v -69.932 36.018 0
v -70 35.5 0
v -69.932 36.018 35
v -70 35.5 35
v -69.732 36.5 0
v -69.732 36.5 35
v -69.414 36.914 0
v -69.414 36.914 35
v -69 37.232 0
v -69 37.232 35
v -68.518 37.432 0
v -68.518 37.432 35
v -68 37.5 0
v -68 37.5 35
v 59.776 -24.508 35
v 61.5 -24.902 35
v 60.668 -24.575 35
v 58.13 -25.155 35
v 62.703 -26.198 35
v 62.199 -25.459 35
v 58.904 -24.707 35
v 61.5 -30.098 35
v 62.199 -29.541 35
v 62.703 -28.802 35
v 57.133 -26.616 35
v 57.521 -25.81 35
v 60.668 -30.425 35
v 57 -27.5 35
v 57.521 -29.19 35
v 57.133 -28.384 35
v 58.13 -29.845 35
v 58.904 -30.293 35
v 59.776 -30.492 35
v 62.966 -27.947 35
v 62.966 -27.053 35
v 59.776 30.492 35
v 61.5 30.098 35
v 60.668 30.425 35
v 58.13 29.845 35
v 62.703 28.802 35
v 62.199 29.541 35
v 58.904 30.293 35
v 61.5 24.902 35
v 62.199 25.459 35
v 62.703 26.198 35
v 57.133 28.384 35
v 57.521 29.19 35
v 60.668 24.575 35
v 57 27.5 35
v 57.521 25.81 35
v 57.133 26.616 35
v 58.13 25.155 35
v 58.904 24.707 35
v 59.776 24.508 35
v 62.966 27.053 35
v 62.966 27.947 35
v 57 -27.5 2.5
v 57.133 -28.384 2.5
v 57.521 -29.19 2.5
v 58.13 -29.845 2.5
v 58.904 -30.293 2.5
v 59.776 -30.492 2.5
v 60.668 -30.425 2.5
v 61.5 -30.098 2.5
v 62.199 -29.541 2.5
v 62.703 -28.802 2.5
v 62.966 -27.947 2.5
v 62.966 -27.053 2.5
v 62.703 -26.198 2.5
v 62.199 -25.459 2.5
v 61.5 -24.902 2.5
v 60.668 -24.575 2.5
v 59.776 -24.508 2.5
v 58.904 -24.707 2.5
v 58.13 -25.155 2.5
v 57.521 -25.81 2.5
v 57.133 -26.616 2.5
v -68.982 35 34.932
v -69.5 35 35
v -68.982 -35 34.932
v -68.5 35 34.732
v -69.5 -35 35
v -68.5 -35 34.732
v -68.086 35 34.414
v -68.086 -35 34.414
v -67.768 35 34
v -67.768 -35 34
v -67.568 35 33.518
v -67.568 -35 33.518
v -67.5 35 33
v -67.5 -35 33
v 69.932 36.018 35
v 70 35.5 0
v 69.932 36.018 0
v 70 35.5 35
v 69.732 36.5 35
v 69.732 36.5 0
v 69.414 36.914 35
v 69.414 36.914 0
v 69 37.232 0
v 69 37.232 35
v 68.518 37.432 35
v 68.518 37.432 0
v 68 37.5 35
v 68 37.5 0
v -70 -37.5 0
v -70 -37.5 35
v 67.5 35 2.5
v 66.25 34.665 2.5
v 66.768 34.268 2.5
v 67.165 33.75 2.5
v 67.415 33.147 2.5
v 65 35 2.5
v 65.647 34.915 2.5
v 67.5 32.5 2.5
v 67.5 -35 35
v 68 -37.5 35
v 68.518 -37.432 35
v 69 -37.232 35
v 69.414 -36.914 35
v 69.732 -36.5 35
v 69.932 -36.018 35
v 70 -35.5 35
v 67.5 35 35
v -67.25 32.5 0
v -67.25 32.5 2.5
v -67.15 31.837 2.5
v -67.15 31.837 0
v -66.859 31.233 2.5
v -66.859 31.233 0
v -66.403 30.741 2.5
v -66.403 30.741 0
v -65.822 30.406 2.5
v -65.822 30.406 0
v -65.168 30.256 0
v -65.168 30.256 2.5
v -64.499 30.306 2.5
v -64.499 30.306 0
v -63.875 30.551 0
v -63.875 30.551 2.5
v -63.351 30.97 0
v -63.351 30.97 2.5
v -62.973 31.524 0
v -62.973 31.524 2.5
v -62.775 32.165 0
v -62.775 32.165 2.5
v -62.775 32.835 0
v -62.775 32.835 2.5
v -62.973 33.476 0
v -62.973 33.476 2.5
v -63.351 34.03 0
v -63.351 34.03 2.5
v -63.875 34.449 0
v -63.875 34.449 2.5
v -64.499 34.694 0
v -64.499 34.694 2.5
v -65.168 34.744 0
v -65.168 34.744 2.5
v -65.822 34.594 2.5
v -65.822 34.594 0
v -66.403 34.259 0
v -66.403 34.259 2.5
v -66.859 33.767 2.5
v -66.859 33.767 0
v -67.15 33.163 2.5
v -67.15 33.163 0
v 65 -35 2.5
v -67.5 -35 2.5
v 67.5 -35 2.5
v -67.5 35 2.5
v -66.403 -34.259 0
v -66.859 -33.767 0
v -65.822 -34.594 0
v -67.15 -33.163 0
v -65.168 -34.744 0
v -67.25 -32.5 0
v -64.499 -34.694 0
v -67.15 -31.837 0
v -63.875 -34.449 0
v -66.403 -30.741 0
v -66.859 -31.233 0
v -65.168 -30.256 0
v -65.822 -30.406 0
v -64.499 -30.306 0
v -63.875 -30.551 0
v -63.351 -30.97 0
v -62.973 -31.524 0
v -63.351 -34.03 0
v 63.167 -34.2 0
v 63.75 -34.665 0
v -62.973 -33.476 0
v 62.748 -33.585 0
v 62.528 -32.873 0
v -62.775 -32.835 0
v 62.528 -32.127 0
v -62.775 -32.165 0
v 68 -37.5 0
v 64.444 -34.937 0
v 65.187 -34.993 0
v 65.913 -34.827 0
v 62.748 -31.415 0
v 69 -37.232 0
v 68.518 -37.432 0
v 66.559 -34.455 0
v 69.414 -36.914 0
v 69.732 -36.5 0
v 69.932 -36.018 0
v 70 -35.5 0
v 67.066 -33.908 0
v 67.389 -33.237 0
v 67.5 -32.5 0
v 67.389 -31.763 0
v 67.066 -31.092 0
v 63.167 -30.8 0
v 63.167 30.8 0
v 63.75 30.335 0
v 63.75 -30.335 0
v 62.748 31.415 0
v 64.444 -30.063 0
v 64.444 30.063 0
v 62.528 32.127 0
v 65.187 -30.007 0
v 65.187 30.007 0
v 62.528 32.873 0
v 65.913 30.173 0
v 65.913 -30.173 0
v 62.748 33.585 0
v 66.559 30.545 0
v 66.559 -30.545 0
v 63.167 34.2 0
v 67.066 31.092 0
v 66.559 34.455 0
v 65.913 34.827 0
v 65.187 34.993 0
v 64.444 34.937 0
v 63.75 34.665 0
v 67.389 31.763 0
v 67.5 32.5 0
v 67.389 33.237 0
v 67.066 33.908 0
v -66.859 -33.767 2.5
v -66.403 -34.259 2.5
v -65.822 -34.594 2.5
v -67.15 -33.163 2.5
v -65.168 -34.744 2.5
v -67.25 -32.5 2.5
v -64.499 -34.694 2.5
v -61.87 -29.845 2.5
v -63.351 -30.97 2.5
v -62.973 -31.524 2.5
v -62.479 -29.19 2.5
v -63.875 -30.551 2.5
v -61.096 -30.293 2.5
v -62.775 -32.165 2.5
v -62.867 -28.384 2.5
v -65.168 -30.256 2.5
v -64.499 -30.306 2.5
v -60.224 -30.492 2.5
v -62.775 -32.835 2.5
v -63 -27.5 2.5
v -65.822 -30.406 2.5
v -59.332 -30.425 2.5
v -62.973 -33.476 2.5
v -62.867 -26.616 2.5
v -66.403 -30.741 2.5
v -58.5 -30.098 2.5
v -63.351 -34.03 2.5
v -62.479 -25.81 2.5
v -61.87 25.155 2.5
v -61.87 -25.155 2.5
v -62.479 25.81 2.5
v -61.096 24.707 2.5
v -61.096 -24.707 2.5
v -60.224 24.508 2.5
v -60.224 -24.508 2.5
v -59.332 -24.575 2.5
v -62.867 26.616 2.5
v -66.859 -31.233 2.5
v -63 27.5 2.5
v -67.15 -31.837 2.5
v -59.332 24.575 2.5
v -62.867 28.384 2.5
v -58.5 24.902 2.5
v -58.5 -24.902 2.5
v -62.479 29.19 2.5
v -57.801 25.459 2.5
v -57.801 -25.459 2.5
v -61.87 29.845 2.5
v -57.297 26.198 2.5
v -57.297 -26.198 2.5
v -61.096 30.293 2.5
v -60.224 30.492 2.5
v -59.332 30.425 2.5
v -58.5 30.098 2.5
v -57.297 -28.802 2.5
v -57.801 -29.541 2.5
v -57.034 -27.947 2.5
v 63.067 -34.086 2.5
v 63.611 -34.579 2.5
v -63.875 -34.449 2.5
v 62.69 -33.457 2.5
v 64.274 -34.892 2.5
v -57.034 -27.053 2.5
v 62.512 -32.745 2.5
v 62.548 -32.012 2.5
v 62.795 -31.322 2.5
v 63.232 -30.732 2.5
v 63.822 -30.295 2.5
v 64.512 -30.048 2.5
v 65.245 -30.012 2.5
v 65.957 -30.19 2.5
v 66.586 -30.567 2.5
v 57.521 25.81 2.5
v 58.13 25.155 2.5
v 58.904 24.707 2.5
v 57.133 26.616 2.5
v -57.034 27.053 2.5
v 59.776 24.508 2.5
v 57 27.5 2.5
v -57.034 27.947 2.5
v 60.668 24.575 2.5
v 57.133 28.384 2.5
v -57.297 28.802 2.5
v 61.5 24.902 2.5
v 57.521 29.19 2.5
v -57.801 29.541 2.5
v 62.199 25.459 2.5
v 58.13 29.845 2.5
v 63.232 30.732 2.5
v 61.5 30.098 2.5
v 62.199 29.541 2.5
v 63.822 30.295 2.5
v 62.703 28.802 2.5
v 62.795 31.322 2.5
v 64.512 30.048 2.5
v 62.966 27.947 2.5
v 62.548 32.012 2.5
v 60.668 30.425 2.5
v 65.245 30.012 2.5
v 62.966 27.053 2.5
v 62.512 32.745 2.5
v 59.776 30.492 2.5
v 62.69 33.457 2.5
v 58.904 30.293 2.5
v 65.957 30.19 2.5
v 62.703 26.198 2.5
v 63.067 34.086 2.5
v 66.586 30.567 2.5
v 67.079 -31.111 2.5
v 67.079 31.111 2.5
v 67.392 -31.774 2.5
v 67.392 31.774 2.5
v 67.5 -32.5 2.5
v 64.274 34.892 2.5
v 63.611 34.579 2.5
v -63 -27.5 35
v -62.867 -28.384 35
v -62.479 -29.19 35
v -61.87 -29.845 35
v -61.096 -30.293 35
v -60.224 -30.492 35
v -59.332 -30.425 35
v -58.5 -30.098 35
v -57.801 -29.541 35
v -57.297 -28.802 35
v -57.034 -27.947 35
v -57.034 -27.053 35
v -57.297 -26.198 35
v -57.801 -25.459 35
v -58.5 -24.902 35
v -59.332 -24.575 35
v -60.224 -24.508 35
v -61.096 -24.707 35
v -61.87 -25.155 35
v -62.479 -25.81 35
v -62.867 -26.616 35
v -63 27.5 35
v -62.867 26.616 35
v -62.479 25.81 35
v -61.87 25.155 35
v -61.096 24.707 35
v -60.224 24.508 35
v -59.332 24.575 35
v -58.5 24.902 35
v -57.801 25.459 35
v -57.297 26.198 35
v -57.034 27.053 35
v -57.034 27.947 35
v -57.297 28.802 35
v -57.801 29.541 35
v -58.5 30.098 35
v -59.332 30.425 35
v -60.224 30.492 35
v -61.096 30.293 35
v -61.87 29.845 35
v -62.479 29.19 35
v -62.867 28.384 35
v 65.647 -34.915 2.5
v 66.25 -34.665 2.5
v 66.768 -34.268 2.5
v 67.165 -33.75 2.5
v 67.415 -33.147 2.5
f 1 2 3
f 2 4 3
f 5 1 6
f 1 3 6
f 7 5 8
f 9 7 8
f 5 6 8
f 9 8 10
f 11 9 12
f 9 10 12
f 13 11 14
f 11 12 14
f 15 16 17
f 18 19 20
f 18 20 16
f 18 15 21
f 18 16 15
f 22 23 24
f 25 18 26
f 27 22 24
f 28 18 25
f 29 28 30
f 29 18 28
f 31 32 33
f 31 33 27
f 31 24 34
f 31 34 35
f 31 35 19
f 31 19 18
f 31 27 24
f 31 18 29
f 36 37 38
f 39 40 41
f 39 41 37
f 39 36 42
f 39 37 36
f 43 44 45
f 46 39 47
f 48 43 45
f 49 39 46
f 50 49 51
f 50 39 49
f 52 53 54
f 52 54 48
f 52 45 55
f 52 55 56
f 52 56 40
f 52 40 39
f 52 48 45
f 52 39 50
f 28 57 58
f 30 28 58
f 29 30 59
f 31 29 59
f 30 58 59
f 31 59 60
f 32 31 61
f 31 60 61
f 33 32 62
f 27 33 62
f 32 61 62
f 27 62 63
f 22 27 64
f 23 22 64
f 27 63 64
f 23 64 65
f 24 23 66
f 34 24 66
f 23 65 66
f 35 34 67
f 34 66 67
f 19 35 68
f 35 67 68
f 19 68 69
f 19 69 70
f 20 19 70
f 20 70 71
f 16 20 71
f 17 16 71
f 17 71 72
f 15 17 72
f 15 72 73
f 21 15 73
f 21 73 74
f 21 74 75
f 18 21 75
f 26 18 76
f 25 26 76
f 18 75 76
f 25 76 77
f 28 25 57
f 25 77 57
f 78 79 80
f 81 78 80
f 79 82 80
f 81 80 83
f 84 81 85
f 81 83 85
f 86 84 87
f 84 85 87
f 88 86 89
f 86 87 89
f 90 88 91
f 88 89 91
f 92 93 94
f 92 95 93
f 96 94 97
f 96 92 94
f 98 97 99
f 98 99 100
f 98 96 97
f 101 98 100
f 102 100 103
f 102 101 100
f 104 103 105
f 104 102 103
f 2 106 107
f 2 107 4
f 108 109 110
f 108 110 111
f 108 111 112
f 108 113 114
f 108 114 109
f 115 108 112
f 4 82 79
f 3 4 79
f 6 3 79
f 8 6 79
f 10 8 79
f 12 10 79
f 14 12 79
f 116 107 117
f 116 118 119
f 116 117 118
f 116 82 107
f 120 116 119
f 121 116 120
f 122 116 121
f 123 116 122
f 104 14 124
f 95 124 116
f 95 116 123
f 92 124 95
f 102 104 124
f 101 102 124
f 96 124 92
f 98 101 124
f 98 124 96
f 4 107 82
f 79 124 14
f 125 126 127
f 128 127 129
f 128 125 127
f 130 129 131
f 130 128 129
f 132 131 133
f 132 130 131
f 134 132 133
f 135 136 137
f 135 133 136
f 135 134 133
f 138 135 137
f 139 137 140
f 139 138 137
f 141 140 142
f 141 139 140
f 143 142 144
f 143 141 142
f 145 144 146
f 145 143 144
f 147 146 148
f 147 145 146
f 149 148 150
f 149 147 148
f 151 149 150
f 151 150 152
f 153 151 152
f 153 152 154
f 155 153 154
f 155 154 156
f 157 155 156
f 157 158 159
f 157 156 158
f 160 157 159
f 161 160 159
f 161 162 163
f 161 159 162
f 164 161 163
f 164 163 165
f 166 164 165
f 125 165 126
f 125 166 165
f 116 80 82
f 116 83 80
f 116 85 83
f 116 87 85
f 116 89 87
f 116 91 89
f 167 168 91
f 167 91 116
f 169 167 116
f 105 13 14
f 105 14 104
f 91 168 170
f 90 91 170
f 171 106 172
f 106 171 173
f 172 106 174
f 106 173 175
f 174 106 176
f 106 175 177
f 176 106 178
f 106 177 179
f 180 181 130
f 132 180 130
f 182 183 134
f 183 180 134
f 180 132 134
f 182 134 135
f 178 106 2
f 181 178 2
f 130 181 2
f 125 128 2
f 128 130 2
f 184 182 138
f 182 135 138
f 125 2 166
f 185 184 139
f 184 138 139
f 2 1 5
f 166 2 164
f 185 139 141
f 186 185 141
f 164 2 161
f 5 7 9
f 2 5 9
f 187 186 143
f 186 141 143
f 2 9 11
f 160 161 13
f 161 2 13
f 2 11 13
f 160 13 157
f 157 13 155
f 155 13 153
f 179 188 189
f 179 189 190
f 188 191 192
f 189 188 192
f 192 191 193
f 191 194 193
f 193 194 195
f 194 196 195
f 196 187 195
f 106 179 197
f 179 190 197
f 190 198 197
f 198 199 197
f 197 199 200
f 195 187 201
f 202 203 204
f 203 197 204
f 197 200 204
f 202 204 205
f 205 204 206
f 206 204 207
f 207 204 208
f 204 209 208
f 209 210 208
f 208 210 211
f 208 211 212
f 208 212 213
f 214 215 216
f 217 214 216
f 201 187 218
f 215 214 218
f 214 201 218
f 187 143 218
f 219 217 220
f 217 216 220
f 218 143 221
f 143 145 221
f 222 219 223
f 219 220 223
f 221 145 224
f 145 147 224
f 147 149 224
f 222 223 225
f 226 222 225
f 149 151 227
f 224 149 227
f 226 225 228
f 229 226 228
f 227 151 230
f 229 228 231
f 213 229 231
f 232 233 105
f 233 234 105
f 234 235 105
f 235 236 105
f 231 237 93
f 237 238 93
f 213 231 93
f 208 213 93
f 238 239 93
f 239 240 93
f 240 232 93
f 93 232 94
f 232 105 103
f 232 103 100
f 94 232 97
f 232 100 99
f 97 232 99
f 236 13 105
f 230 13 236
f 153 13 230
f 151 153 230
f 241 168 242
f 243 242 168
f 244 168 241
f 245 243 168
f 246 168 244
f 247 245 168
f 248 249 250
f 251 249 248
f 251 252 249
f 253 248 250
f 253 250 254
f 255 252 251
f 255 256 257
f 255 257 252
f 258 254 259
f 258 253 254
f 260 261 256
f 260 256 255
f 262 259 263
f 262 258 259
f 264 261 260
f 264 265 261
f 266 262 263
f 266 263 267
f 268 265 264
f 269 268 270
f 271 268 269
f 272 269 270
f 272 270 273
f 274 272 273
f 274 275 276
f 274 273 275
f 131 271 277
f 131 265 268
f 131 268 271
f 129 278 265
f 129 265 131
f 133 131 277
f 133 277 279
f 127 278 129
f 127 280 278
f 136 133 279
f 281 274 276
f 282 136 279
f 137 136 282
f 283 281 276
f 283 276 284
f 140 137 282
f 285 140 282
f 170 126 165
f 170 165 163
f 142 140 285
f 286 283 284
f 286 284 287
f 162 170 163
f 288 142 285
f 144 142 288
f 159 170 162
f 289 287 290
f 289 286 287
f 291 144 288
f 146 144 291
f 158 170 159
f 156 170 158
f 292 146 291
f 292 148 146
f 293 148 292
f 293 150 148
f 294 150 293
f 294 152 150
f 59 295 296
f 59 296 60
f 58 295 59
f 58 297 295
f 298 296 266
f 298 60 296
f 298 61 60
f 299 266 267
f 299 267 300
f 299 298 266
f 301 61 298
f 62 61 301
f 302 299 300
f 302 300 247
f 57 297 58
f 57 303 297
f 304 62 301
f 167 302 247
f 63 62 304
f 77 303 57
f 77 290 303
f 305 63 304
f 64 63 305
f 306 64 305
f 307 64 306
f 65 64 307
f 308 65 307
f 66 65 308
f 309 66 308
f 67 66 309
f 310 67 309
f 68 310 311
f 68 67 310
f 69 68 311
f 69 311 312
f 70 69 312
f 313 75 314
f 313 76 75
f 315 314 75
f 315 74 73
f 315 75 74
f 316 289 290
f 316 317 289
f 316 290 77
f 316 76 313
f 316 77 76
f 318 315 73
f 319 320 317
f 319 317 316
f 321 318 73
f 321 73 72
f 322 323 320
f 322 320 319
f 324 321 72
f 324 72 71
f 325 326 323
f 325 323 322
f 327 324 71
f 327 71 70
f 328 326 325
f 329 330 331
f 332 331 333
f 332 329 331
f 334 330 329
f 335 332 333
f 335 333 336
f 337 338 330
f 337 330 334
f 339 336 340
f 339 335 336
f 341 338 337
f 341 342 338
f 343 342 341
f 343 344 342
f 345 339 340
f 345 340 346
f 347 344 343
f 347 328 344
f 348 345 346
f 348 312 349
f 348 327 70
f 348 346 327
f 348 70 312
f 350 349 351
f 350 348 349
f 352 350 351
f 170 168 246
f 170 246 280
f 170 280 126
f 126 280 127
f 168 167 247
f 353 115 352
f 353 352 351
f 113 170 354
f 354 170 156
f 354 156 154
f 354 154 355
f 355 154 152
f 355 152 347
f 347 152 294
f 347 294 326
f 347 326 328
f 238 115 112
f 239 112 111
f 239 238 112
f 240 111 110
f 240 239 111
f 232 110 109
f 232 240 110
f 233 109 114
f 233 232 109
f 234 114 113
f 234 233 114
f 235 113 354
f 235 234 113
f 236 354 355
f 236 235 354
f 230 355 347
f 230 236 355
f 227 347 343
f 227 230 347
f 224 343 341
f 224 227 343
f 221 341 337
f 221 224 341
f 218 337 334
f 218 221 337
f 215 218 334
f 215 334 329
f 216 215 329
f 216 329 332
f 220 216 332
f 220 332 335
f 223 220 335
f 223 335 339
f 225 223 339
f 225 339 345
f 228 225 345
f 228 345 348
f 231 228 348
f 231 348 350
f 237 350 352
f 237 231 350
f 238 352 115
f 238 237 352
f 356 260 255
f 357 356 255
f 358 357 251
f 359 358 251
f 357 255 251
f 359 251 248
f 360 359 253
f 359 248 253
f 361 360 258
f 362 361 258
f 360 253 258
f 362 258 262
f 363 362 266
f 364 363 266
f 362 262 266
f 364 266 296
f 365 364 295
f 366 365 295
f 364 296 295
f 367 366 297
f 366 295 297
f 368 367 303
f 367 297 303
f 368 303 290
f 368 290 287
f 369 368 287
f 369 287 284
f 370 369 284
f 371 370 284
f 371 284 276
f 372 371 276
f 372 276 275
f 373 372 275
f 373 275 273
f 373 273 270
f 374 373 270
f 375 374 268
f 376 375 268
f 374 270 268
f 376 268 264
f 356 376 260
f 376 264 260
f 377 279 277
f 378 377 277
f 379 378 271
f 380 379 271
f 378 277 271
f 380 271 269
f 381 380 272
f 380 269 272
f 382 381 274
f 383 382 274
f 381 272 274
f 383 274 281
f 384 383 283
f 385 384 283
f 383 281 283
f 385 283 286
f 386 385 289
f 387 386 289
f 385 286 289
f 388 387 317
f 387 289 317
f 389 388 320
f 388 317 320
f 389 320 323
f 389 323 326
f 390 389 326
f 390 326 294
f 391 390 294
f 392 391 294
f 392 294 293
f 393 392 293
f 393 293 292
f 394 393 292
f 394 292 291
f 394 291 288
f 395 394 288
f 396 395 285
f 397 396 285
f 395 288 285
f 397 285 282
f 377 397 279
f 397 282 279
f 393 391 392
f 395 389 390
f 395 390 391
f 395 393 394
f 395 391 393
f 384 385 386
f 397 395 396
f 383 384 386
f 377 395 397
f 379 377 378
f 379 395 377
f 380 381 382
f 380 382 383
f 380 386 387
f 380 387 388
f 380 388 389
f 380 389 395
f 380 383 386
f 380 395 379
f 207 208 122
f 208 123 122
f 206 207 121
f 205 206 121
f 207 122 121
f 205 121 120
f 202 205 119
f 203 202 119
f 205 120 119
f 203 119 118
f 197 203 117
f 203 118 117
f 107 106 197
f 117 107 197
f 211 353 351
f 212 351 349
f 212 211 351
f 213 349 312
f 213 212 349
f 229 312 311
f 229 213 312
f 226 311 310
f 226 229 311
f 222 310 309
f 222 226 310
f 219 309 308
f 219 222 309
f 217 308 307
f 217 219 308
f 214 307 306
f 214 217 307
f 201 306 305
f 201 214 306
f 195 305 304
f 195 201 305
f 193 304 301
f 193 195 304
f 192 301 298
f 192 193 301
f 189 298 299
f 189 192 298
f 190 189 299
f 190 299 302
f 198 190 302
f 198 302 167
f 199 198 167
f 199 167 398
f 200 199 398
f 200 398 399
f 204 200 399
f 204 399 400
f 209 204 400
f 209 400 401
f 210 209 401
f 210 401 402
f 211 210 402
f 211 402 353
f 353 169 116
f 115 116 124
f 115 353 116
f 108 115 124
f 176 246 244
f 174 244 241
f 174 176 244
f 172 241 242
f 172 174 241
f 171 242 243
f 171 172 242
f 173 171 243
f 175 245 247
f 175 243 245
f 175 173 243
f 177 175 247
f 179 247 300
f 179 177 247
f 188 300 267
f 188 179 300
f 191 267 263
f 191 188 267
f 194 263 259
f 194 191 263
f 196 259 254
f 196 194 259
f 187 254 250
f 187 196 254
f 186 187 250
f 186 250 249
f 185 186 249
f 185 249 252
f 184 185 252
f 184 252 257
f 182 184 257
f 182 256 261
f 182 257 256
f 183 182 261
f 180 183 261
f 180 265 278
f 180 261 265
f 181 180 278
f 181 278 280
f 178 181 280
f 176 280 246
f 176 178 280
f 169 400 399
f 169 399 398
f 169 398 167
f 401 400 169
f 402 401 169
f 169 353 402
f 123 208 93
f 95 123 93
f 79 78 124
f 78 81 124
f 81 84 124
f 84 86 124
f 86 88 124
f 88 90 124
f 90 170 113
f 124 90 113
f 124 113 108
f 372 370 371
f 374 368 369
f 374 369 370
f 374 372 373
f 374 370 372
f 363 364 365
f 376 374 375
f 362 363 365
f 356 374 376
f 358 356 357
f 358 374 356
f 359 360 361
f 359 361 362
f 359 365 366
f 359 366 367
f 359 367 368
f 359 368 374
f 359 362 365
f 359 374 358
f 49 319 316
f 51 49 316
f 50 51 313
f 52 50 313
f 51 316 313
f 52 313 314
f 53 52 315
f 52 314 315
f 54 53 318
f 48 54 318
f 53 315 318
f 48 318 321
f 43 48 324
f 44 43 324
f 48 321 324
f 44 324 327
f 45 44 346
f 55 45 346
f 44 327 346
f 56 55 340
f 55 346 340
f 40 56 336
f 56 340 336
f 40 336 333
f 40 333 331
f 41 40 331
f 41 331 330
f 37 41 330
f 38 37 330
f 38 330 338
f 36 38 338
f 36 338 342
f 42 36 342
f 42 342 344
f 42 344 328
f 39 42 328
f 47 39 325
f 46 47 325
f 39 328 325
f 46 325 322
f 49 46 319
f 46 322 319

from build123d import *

# Parameters (mm, degrees)
SKETCH1_W           = 140
SKETCH1_H           = 75
BOSS_EXTRUDE1_DEPTH = 35
SHELL1_T            = -2.5
SKETCH2_R           = 3
BOSS_EXTRUDE2_DEPTH = 32.5
SKETCH3_R           = 2.25
SKETCH3_R_2         = 2.5
CUT_EXTRUDE1_DEPTH  = 35
FILLET1_R           = 2


with BuildPart() as part:
    # Sketch1 → Boss-Extrude1 (new body)
    with BuildSketch(Plane.XY):
        Rectangle(SKETCH1_W, SKETCH1_H)
    extrude(amount=BOSS_EXTRUDE1_DEPTH)

    # Shell1
    shell1_openings = [part.faces().sort_by_distance(p)[0] for p in [
        (0, 0, 35),
    ]]
    offset(amount=SHELL1_T, openings=shell1_openings, kind=Kind.INTERSECTION)

    # Sketch2 → Boss-Extrude2 (add)
    with BuildSketch(Plane.XY.offset(2.5)):
        with Locations(Location((-60, -27.5, 0), (0, 0, 180))):
            Circle(SKETCH2_R)
        with Locations(Location((60, -27.5, 0), (0, 0, 180))):
            Circle(SKETCH2_R)
        with Locations(Location((-60, 27.5, 0), (0, 0, 180))):
            Circle(SKETCH2_R)
        with Locations(Location((60, 27.5, 0), (0, 0, 180))):
            Circle(SKETCH2_R)
    extrude(amount=BOSS_EXTRUDE2_DEPTH)

    # Sketch3 → Cut-Extrude1 (cut)
    with BuildSketch(Plane.XY):
        with Locations(Location((-65, -32.5, 0), (0, 0, 180))):
            Circle(SKETCH3_R)
        with Locations((65, -32.5)):
            Circle(SKETCH3_R_2)
        with Locations(Location((-65, 32.5, 0), (0, 0, 180))):
            Circle(SKETCH3_R)
        with Locations((65, 32.5)):
            Circle(SKETCH3_R_2)
    extrude(amount=CUT_EXTRUDE1_DEPTH, mode=Mode.SUBTRACT)

    # Fillet1
    fillet1_edges = [part.edges().sort_by_distance(p)[0] for p in [
        (-67.5, 0, 35),
        (70, -37.5, 17.5),
        (-70, 37.5, 17.5),
        (70, 37.5, 17.5),
    ]]
    fillet(fillet1_edges, radius=FILLET1_R)


solid = part.part
